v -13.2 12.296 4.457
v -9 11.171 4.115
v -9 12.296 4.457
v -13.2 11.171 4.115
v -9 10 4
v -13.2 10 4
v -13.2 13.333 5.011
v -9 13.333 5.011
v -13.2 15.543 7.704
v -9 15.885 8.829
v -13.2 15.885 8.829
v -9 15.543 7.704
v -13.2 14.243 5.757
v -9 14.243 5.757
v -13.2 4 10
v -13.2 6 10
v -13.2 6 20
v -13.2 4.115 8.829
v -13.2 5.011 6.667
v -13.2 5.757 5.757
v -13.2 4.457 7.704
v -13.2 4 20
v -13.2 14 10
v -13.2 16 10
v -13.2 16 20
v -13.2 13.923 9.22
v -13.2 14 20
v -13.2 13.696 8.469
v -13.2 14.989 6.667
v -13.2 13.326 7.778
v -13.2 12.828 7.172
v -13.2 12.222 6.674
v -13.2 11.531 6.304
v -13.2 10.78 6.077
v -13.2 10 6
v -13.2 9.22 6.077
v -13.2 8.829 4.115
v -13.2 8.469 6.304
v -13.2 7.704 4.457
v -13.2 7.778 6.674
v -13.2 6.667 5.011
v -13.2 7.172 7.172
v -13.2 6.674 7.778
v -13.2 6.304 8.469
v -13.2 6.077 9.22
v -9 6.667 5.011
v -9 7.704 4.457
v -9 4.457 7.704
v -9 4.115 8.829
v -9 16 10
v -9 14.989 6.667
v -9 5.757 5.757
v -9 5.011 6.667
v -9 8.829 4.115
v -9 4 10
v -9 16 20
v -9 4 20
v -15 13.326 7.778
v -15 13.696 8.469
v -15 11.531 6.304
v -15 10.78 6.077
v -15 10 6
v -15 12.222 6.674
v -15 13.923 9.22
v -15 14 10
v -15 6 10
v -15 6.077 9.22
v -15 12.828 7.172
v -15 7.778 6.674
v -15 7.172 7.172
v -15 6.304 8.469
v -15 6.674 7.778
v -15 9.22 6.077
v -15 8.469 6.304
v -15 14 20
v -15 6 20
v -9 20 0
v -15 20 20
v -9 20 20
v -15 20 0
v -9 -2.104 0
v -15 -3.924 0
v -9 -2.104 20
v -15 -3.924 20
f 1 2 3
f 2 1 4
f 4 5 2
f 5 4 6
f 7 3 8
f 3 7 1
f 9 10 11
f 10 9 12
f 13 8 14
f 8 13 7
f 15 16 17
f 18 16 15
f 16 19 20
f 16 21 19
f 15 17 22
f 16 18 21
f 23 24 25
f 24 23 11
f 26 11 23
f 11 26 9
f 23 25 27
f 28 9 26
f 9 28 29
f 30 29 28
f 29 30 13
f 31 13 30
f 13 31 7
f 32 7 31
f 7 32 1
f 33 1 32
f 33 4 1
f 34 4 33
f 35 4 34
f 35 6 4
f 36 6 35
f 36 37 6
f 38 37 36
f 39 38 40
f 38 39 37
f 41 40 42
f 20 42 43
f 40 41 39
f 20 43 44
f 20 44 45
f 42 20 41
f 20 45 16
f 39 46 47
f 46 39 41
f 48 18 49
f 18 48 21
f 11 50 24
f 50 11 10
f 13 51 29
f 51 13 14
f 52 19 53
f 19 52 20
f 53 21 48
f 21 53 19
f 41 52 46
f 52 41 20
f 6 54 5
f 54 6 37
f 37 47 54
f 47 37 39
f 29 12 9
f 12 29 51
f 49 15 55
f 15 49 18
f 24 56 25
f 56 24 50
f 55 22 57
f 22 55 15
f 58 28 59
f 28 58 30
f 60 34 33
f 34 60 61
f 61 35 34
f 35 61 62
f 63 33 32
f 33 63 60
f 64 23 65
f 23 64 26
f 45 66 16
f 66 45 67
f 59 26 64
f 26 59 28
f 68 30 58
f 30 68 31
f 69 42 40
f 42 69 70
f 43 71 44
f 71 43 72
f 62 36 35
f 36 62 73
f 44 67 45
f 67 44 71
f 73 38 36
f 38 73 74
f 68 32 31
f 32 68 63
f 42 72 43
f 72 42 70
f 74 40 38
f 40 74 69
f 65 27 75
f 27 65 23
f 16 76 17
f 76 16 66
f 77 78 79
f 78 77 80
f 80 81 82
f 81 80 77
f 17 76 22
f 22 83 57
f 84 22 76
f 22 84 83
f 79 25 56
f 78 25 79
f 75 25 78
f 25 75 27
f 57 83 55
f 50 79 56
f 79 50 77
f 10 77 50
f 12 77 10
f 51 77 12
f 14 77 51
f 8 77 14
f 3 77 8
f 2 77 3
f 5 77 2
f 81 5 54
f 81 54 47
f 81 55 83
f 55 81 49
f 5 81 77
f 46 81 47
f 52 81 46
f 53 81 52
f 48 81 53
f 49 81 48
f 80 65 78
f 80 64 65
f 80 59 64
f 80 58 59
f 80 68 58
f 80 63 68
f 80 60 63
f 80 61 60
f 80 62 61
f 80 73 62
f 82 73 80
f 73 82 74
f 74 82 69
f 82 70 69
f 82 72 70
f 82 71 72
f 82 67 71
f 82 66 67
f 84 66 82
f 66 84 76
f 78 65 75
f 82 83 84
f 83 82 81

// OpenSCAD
// file: bumper_spring_block_base.scad
include <generic/lib.scad>;

use <chassis_base.scad>;

kChassisBaseDatasheet = vChassisBaseDatasheet();

function vBumperSpringBlockBaseDatasheet() =
     let(thickness=property(kChassisBaseDatasheet, "thickness"),
         seat_thickness=3 * thickness, slot_width=5, spring_travel_distance=5,
         spring_max_length=spring_travel_distance + slot_width + 2 * seat_thickness)
     [["height", 20], ["width", 20], ["depth", 35], ["thickness", thickness], ["angular_offset", 70],
      ["spring_outer_diameter", 12], ["spring_inner_diameter", 8], ["spring_lock_size", 2 * thickness],
      ["spring_seat_thickness", seat_thickness], ["spring_slot_width", slot_width],
      ["spring_travel_distance", spring_travel_distance],
      ["spring_max_length", spring_max_length]];


module mBumperSpringBlockSeatComplement() {
     datasheet = vBumperSpringBlockBaseDatasheet();
     height = property(datasheet, "height");
     width = property(datasheet, "width");
     depth = property(datasheet, "depth");
     thickness = property(datasheet, "thickness");
     angular_offset = property(datasheet, "angular_offset");

     spring_outer_diameter = property(datasheet, "spring_outer_diameter");
     spring_inner_diameter = property(datasheet, "spring_inner_diameter");
     spring_lock_size = property(datasheet, "spring_lock_size");
     spring_seat_thickness = property(datasheet, "spring_seat_thickness");
     spring_slot_width = property(datasheet, "spring_slot_width");
     spring_travel_distance = property(datasheet, "spring_travel_distance");
     spring_max_length = property(datasheet, "spring_max_length");

     base_chassis_height = property(kChassisBaseDatasheet, "base_height");

     translate([spring_seat_thickness - spring_lock_size, width/2, height/2]) {
          rotate([0, 90, 0]) {
               translate([0, 0, -(spring_max_length - spring_slot_width) - kEpsilon]) {
                    cylinder(d=spring_inner_diameter, h=spring_max_length - spring_slot_width + 2 * kEpsilon);
                    translate([-(base_chassis_height - height/2) - kEpsilon, -spring_inner_diameter/2, 0]) {
                         cube([base_chassis_height - height/2 + kEpsilon, spring_inner_diameter,
                               spring_max_length - spring_slot_width + 2 * kEpsilon]);
                    }
                    translate([0, 0, spring_seat_thickness - spring_lock_size - kEpsilon]) {
                         cylinder(d=spring_outer_diameter, h=spring_max_length - spring_slot_width - 2 * (spring_seat_thickness - spring_lock_size) + 2 * kEpsilon);
                         translate([-(base_chassis_height - height/2) - kEpsilon, -spring_outer_diameter/2, 0]) {
                              cube([base_chassis_height - height/2 + kEpsilon, spring_outer_diameter,
                                    spring_max_length - spring_slot_width - 2 * (spring_seat_thickness - spring_lock_size)]);
                         }
                    }
               }
          }
     }
}

mBumperSpringBlockSeatComplement();

module mBumperSpringBlockXSection() {
     datasheet = vBumperSpringBlockBaseDatasheet();
     height = property(datasheet, "height");
     width = property(datasheet, "width");
     depth = property(datasheet, "depth");
     thickness = property(datasheet, "thickness");
     angular_offset = property(datasheet, "angular_offset");

     spring_lock_size = property(datasheet, "spring_lock_size");
     spring_seat_thickness = property(datasheet, "spring_seat_thickness");
     spring_slot_width = property(datasheet, "spring_slot_width");
     spring_travel_distance = property(datasheet, "spring_travel_distance");
     spring_max_length = property(datasheet, "spring_max_length");

     chassis_outer_diameter = property(kChassisBaseDatasheet, "outer_diameter");
     difference() {
          translate([-spring_lock_size, width - chassis_outer_diameter/2]) {
               outline(delta=-thickness) {
                    square([depth, chassis_outer_diameter/2]);
               }
               square([spring_seat_thickness, chassis_outer_diameter/2]);
               translate([spring_slot_width + spring_seat_thickness, 0]) {
                    square([depth - spring_slot_width - spring_seat_thickness, chassis_outer_diameter/2]);
               }
               translate([-(spring_max_length - spring_slot_width - 2 * spring_seat_thickness), 0]) {
                    translate([-spring_seat_thickness, 0]) {
                         square([spring_seat_thickness, chassis_outer_diameter/2]);
                    }
               }
          }
          translate([-chassis_outer_diameter/2 * cos(angular_offset), chassis_outer_diameter/2 * sin(angular_offset)]) {
               ring(inner_radius=chassis_outer_diameter/2 - kEpsilon, outer_radius=chassis_outer_diameter);
          }
     }
}

mBumperSpringBlockXSection();
// file: chassis_base.scad
include <generic/lib.scad>;

function vChassisBaseDatasheet() =
     let(outer_diameter=300, thickness=2, inner_diameter=outer_diameter - 2 * thickness,
         base_height=100, cover_height=20, outer_height=base_height + cover_height,
         inner_height=outer_height - 2 * thickness)
     [["outer_diameter", outer_diameter], ["inner_diameter", inner_diameter],
      ["base_height", base_height], ["height", outer_height],
      ["inner_height", inner_height], ["thickness", thickness],
      ["z_offset", 20], ["fillet_radius", 5]];

module mChassisOuterVolume() {
     datasheet = vChassisBaseDatasheet();
     rounded_cylinder(diameter=property(datasheet, "outer_diameter"),
                      height=property(datasheet, "height"),
                      fillet_radius=property(datasheet, "fillet_radius"));
}

module mChassisInnerVolume() {
     datasheet = vChassisBaseDatasheet();
     translate([0, 0, property(datasheet, "thickness")]) {
          rounded_cylinder(diameter=property(datasheet, "inner_diameter"),
                           height=property(datasheet, "inner_height"),
                           fillet_radius=property(datasheet, "fillet_radius"));
     }
}

module mChassisBBox() {
     datasheet = vChassisBaseDatasheet();
     chassis_height = property(datasheet, "height");
     chassis_outer_diameter = property(datasheet, "outer_diameter");
     translate([0., 0., chassis_height/2]) {
          cube([chassis_outer_diameter, chassis_outer_diameter, chassis_height], center=true);
     }
}

module mChassisShell() {
     difference() {
          mChassisOuterVolume();
          mChassisInnerVolume();
     }
}


module mChassisBase() {

}

mChassisBase();
// main file
include <generic/lib.scad>;

use <chassis_base.scad>;
use <bumper_spring_block_base.scad>;

kChassisBaseDatasheet = vChassisBaseDatasheet();

function vBumperSpringBlock_PartB_Datasheet() =
     vBumperSpringBlockBaseDatasheet();


module mBumperSpringBlock_PartB() {
     datasheet = vBumperSpringBlock_PartB_Datasheet();
     height = property(datasheet, "height");
     depth = property(datasheet, "depth");
     spring_lock_size = property(datasheet, "spring_lock_size");

     chassis_outer_diameter = property(kChassisBaseDatasheet, "outer_diameter");

     module mBumperSpringBlock_PartB_XSection() {
          translate([-spring_lock_size, -spring_lock_size]) {
               difference() {
                    translate([spring_lock_size, spring_lock_size]) mBumperSpringBlockXSection();
                    square([depth, chassis_outer_diameter/2]);
               }
          }
     }

     render() {
          difference() {
               linear_extrude(height=height) {
                    mBumperSpringBlock_PartB_XSection();
               }
               mBumperSpringBlockSeatComplement();
          }
     }
}


mBumperSpringBlock_PartB();
